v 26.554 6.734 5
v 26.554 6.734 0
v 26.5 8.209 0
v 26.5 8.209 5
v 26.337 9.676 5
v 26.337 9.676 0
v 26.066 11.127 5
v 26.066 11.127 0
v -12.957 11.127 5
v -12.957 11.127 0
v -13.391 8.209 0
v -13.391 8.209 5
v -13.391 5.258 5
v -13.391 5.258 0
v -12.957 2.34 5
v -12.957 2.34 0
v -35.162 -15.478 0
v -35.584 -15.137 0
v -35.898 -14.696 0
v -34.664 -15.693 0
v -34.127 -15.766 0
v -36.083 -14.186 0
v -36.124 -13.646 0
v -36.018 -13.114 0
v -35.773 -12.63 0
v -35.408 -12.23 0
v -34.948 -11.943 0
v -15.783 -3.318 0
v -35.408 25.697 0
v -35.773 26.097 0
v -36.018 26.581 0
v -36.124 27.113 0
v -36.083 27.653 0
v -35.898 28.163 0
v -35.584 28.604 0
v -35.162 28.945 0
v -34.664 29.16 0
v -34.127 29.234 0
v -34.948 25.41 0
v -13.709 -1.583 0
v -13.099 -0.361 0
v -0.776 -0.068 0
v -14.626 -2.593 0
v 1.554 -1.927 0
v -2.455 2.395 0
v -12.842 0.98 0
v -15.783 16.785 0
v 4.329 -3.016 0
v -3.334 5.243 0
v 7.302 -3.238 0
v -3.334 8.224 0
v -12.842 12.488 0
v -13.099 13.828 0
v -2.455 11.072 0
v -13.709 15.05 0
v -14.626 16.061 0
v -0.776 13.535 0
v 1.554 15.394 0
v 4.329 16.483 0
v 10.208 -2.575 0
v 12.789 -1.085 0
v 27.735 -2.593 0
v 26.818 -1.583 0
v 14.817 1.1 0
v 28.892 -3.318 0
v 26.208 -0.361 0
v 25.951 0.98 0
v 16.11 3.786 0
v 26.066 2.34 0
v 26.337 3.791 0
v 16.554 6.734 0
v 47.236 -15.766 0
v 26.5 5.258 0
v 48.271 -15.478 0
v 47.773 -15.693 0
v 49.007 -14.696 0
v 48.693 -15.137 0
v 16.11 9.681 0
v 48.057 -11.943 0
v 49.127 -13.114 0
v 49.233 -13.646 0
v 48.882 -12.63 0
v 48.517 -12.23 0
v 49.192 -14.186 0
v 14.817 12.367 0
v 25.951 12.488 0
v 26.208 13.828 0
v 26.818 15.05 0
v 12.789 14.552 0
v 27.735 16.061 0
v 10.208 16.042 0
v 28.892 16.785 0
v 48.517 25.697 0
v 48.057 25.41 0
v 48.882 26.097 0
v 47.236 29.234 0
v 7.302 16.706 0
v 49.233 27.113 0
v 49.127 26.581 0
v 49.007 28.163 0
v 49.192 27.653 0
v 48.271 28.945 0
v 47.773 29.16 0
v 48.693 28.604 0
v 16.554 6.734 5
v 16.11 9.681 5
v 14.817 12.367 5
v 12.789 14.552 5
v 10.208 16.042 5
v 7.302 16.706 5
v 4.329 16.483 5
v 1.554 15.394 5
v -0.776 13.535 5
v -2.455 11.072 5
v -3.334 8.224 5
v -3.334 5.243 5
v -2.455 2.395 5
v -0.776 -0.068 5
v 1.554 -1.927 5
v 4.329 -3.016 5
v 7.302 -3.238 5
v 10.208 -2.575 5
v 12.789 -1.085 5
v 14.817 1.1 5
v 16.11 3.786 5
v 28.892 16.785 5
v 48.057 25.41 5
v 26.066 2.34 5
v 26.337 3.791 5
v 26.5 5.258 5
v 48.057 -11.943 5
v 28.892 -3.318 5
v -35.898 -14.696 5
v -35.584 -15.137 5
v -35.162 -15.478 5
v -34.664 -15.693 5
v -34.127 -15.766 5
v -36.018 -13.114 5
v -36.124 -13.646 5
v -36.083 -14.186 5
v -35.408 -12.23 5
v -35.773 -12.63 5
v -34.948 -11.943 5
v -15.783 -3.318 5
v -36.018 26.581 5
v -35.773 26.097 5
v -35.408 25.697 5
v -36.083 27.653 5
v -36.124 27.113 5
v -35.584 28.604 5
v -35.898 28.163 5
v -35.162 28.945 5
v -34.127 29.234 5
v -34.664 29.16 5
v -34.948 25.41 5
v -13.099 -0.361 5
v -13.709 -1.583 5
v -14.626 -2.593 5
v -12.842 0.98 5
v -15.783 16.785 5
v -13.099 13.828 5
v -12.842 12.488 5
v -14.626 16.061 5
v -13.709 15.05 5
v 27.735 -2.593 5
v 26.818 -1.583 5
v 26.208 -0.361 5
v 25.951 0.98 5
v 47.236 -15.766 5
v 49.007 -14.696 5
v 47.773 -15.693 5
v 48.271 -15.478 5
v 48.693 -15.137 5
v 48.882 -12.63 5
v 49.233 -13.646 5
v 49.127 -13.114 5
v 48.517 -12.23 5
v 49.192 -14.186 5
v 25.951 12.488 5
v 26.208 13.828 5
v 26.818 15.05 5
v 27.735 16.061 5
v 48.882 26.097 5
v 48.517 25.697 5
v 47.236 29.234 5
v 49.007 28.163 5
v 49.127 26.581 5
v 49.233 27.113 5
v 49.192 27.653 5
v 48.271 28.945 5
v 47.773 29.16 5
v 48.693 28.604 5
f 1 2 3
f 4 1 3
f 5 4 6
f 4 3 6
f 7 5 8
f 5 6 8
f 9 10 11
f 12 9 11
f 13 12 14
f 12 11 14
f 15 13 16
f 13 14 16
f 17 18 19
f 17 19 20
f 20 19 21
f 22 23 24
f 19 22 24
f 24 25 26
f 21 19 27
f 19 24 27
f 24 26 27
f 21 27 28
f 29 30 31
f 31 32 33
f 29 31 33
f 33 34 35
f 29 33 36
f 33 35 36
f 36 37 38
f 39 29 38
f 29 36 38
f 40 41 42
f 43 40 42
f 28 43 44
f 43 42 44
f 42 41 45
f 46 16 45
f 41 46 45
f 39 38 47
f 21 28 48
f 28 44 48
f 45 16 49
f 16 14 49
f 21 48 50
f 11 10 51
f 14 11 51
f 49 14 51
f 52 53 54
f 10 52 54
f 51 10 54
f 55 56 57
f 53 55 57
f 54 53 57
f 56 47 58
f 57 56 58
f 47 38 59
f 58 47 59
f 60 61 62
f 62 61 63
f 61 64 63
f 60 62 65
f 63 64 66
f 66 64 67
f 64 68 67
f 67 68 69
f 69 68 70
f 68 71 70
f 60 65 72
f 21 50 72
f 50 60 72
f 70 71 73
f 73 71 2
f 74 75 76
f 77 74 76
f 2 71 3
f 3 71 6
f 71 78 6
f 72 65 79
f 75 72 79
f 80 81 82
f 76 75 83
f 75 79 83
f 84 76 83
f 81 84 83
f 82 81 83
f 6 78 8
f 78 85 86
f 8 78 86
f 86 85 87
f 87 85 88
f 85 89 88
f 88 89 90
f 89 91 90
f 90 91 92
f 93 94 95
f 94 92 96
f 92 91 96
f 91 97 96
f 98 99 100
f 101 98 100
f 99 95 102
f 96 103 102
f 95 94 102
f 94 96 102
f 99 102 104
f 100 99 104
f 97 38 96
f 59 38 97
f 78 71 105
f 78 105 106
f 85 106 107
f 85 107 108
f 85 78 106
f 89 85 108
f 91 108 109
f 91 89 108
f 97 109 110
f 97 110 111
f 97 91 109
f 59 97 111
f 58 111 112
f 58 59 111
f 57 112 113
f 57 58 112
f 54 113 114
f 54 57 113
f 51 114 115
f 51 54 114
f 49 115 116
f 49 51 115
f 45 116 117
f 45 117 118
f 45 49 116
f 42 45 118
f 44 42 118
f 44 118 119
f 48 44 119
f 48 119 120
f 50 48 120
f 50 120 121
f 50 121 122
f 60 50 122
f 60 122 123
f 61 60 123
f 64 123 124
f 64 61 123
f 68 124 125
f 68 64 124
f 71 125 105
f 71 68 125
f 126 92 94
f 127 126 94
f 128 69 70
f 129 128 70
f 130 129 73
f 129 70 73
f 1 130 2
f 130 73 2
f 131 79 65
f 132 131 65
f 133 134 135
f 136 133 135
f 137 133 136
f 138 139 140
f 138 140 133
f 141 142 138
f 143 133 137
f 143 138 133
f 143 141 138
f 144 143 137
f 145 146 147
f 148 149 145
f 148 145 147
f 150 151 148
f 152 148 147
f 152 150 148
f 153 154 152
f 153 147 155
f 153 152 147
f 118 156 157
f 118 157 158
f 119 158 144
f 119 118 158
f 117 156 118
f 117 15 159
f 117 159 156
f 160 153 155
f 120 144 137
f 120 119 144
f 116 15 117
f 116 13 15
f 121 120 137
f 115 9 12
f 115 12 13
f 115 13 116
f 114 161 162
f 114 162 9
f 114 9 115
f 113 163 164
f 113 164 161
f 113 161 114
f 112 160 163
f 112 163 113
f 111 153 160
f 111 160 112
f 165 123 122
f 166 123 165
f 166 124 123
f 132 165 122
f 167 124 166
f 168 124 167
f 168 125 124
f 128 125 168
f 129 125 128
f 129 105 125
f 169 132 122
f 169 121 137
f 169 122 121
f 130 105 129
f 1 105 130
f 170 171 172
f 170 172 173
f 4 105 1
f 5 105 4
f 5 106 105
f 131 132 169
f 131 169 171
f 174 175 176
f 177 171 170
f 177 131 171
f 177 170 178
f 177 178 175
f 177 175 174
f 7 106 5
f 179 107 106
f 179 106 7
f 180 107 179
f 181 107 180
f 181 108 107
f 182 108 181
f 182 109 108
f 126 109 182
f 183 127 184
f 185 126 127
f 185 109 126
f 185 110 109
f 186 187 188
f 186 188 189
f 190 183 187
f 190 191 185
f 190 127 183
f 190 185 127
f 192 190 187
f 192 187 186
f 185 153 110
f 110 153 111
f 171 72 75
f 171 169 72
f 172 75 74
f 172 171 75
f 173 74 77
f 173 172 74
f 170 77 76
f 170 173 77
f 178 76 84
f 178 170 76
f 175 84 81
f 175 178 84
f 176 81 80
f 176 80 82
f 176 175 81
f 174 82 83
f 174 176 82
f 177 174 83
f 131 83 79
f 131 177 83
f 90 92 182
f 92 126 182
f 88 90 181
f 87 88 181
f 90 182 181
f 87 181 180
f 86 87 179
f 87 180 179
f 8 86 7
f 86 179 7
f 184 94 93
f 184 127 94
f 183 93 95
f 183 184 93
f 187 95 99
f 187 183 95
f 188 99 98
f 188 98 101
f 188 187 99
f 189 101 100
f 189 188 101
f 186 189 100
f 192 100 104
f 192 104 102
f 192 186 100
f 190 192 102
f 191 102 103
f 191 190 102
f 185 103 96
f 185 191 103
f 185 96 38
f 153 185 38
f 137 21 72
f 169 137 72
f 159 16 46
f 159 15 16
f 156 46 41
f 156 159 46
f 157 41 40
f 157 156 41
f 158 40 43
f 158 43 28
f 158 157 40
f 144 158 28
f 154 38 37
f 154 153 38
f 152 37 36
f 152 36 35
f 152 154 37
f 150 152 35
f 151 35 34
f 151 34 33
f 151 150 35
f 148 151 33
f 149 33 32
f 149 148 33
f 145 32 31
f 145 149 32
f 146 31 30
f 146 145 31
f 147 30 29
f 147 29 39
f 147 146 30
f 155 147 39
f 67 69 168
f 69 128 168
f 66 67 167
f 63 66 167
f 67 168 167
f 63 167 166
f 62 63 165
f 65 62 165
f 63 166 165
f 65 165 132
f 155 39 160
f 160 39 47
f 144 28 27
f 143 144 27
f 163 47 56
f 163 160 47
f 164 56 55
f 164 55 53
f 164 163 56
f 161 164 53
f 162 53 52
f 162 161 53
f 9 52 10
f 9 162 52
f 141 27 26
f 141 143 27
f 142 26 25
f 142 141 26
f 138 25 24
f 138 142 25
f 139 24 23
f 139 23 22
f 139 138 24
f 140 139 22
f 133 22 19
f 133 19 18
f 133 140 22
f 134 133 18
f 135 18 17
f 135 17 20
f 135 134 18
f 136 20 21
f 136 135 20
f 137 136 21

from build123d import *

# Parameters (mm, degrees)
F0_R     = 10
F1_DEPTH = 5
F2_R     = 2
F3_R     = 5


with BuildPart() as f1:
    # F0 (on Top) → F1 (new body)
    with BuildSketch(Plane.XY):
        with BuildLine():
            ThreePointArc((24.792896, 14.940892), (6.554466, 26.733598), (-11.683964, 14.940892))
            ThreePointArc((-11.683964, 14.940892), (-13.445534, 6.733598), (-11.683964, -1.473696))
            ThreePointArc((-11.683964, -1.473696), (6.554466, -13.266402), (24.792896, -1.473696))
            ThreePointArc((24.792896, -1.473696), (26.109115, 2.536492), (26.554466, 6.733598))
            ThreePointArc((26.554466, 6.733598), (26.109115, 10.930704), (24.792896, 14.940892))
        make_face()
        with Locations((6.554466, 6.733598)):
            Circle(F0_R, mode=Mode.SUBTRACT)
        with BuildLine():
            Line((56.554466, 29.233598), (-43.445534, 29.233598))
            Line((-43.445534, 29.233598), (-11.683964, 14.940892))
            ThreePointArc((-11.683964, 14.940892), (6.554466, 26.733598), (24.792896, 14.940892))
            Line((24.792896, 14.940892), (56.554466, 29.233598))
        make_face()
        with BuildLine():
            ThreePointArc((24.792896, -1.473696), (6.554466, -13.266402), (-11.683964, -1.473696))
            Line((-11.683964, -1.473696), (-43.445534, -15.766402))
            Line((-43.445534, -15.766402), (56.554466, -15.766402))
            Line((56.554466, -15.766402), (24.792896, -1.473696))
        make_face()
    extrude(amount=F1_DEPTH)

    # F2
    f2_edges = [f1.edges().sort_by_distance(p)[0] for p in [
        (-43.445534, 29.233598, 2.5),
        (-43.445534, -15.766402, 2.5),
        (56.554466, -15.766402, 2.5),
        (56.554466, 29.233598, 2.5),
    ]]
    fillet(f2_edges, radius=F2_R)

    # F3
    f3_edges = [f1.edges().sort_by_distance(p)[0] for p in [
        (24.792896, 14.940892, 2.5),
        (24.792896, -1.473696, 2.5),
        (-11.683964, -1.473696, 2.5),
        (-11.683964, 14.940892, 2.5),
    ]]
    fillet(f3_edges, radius=F3_R)


solid = f1.part
